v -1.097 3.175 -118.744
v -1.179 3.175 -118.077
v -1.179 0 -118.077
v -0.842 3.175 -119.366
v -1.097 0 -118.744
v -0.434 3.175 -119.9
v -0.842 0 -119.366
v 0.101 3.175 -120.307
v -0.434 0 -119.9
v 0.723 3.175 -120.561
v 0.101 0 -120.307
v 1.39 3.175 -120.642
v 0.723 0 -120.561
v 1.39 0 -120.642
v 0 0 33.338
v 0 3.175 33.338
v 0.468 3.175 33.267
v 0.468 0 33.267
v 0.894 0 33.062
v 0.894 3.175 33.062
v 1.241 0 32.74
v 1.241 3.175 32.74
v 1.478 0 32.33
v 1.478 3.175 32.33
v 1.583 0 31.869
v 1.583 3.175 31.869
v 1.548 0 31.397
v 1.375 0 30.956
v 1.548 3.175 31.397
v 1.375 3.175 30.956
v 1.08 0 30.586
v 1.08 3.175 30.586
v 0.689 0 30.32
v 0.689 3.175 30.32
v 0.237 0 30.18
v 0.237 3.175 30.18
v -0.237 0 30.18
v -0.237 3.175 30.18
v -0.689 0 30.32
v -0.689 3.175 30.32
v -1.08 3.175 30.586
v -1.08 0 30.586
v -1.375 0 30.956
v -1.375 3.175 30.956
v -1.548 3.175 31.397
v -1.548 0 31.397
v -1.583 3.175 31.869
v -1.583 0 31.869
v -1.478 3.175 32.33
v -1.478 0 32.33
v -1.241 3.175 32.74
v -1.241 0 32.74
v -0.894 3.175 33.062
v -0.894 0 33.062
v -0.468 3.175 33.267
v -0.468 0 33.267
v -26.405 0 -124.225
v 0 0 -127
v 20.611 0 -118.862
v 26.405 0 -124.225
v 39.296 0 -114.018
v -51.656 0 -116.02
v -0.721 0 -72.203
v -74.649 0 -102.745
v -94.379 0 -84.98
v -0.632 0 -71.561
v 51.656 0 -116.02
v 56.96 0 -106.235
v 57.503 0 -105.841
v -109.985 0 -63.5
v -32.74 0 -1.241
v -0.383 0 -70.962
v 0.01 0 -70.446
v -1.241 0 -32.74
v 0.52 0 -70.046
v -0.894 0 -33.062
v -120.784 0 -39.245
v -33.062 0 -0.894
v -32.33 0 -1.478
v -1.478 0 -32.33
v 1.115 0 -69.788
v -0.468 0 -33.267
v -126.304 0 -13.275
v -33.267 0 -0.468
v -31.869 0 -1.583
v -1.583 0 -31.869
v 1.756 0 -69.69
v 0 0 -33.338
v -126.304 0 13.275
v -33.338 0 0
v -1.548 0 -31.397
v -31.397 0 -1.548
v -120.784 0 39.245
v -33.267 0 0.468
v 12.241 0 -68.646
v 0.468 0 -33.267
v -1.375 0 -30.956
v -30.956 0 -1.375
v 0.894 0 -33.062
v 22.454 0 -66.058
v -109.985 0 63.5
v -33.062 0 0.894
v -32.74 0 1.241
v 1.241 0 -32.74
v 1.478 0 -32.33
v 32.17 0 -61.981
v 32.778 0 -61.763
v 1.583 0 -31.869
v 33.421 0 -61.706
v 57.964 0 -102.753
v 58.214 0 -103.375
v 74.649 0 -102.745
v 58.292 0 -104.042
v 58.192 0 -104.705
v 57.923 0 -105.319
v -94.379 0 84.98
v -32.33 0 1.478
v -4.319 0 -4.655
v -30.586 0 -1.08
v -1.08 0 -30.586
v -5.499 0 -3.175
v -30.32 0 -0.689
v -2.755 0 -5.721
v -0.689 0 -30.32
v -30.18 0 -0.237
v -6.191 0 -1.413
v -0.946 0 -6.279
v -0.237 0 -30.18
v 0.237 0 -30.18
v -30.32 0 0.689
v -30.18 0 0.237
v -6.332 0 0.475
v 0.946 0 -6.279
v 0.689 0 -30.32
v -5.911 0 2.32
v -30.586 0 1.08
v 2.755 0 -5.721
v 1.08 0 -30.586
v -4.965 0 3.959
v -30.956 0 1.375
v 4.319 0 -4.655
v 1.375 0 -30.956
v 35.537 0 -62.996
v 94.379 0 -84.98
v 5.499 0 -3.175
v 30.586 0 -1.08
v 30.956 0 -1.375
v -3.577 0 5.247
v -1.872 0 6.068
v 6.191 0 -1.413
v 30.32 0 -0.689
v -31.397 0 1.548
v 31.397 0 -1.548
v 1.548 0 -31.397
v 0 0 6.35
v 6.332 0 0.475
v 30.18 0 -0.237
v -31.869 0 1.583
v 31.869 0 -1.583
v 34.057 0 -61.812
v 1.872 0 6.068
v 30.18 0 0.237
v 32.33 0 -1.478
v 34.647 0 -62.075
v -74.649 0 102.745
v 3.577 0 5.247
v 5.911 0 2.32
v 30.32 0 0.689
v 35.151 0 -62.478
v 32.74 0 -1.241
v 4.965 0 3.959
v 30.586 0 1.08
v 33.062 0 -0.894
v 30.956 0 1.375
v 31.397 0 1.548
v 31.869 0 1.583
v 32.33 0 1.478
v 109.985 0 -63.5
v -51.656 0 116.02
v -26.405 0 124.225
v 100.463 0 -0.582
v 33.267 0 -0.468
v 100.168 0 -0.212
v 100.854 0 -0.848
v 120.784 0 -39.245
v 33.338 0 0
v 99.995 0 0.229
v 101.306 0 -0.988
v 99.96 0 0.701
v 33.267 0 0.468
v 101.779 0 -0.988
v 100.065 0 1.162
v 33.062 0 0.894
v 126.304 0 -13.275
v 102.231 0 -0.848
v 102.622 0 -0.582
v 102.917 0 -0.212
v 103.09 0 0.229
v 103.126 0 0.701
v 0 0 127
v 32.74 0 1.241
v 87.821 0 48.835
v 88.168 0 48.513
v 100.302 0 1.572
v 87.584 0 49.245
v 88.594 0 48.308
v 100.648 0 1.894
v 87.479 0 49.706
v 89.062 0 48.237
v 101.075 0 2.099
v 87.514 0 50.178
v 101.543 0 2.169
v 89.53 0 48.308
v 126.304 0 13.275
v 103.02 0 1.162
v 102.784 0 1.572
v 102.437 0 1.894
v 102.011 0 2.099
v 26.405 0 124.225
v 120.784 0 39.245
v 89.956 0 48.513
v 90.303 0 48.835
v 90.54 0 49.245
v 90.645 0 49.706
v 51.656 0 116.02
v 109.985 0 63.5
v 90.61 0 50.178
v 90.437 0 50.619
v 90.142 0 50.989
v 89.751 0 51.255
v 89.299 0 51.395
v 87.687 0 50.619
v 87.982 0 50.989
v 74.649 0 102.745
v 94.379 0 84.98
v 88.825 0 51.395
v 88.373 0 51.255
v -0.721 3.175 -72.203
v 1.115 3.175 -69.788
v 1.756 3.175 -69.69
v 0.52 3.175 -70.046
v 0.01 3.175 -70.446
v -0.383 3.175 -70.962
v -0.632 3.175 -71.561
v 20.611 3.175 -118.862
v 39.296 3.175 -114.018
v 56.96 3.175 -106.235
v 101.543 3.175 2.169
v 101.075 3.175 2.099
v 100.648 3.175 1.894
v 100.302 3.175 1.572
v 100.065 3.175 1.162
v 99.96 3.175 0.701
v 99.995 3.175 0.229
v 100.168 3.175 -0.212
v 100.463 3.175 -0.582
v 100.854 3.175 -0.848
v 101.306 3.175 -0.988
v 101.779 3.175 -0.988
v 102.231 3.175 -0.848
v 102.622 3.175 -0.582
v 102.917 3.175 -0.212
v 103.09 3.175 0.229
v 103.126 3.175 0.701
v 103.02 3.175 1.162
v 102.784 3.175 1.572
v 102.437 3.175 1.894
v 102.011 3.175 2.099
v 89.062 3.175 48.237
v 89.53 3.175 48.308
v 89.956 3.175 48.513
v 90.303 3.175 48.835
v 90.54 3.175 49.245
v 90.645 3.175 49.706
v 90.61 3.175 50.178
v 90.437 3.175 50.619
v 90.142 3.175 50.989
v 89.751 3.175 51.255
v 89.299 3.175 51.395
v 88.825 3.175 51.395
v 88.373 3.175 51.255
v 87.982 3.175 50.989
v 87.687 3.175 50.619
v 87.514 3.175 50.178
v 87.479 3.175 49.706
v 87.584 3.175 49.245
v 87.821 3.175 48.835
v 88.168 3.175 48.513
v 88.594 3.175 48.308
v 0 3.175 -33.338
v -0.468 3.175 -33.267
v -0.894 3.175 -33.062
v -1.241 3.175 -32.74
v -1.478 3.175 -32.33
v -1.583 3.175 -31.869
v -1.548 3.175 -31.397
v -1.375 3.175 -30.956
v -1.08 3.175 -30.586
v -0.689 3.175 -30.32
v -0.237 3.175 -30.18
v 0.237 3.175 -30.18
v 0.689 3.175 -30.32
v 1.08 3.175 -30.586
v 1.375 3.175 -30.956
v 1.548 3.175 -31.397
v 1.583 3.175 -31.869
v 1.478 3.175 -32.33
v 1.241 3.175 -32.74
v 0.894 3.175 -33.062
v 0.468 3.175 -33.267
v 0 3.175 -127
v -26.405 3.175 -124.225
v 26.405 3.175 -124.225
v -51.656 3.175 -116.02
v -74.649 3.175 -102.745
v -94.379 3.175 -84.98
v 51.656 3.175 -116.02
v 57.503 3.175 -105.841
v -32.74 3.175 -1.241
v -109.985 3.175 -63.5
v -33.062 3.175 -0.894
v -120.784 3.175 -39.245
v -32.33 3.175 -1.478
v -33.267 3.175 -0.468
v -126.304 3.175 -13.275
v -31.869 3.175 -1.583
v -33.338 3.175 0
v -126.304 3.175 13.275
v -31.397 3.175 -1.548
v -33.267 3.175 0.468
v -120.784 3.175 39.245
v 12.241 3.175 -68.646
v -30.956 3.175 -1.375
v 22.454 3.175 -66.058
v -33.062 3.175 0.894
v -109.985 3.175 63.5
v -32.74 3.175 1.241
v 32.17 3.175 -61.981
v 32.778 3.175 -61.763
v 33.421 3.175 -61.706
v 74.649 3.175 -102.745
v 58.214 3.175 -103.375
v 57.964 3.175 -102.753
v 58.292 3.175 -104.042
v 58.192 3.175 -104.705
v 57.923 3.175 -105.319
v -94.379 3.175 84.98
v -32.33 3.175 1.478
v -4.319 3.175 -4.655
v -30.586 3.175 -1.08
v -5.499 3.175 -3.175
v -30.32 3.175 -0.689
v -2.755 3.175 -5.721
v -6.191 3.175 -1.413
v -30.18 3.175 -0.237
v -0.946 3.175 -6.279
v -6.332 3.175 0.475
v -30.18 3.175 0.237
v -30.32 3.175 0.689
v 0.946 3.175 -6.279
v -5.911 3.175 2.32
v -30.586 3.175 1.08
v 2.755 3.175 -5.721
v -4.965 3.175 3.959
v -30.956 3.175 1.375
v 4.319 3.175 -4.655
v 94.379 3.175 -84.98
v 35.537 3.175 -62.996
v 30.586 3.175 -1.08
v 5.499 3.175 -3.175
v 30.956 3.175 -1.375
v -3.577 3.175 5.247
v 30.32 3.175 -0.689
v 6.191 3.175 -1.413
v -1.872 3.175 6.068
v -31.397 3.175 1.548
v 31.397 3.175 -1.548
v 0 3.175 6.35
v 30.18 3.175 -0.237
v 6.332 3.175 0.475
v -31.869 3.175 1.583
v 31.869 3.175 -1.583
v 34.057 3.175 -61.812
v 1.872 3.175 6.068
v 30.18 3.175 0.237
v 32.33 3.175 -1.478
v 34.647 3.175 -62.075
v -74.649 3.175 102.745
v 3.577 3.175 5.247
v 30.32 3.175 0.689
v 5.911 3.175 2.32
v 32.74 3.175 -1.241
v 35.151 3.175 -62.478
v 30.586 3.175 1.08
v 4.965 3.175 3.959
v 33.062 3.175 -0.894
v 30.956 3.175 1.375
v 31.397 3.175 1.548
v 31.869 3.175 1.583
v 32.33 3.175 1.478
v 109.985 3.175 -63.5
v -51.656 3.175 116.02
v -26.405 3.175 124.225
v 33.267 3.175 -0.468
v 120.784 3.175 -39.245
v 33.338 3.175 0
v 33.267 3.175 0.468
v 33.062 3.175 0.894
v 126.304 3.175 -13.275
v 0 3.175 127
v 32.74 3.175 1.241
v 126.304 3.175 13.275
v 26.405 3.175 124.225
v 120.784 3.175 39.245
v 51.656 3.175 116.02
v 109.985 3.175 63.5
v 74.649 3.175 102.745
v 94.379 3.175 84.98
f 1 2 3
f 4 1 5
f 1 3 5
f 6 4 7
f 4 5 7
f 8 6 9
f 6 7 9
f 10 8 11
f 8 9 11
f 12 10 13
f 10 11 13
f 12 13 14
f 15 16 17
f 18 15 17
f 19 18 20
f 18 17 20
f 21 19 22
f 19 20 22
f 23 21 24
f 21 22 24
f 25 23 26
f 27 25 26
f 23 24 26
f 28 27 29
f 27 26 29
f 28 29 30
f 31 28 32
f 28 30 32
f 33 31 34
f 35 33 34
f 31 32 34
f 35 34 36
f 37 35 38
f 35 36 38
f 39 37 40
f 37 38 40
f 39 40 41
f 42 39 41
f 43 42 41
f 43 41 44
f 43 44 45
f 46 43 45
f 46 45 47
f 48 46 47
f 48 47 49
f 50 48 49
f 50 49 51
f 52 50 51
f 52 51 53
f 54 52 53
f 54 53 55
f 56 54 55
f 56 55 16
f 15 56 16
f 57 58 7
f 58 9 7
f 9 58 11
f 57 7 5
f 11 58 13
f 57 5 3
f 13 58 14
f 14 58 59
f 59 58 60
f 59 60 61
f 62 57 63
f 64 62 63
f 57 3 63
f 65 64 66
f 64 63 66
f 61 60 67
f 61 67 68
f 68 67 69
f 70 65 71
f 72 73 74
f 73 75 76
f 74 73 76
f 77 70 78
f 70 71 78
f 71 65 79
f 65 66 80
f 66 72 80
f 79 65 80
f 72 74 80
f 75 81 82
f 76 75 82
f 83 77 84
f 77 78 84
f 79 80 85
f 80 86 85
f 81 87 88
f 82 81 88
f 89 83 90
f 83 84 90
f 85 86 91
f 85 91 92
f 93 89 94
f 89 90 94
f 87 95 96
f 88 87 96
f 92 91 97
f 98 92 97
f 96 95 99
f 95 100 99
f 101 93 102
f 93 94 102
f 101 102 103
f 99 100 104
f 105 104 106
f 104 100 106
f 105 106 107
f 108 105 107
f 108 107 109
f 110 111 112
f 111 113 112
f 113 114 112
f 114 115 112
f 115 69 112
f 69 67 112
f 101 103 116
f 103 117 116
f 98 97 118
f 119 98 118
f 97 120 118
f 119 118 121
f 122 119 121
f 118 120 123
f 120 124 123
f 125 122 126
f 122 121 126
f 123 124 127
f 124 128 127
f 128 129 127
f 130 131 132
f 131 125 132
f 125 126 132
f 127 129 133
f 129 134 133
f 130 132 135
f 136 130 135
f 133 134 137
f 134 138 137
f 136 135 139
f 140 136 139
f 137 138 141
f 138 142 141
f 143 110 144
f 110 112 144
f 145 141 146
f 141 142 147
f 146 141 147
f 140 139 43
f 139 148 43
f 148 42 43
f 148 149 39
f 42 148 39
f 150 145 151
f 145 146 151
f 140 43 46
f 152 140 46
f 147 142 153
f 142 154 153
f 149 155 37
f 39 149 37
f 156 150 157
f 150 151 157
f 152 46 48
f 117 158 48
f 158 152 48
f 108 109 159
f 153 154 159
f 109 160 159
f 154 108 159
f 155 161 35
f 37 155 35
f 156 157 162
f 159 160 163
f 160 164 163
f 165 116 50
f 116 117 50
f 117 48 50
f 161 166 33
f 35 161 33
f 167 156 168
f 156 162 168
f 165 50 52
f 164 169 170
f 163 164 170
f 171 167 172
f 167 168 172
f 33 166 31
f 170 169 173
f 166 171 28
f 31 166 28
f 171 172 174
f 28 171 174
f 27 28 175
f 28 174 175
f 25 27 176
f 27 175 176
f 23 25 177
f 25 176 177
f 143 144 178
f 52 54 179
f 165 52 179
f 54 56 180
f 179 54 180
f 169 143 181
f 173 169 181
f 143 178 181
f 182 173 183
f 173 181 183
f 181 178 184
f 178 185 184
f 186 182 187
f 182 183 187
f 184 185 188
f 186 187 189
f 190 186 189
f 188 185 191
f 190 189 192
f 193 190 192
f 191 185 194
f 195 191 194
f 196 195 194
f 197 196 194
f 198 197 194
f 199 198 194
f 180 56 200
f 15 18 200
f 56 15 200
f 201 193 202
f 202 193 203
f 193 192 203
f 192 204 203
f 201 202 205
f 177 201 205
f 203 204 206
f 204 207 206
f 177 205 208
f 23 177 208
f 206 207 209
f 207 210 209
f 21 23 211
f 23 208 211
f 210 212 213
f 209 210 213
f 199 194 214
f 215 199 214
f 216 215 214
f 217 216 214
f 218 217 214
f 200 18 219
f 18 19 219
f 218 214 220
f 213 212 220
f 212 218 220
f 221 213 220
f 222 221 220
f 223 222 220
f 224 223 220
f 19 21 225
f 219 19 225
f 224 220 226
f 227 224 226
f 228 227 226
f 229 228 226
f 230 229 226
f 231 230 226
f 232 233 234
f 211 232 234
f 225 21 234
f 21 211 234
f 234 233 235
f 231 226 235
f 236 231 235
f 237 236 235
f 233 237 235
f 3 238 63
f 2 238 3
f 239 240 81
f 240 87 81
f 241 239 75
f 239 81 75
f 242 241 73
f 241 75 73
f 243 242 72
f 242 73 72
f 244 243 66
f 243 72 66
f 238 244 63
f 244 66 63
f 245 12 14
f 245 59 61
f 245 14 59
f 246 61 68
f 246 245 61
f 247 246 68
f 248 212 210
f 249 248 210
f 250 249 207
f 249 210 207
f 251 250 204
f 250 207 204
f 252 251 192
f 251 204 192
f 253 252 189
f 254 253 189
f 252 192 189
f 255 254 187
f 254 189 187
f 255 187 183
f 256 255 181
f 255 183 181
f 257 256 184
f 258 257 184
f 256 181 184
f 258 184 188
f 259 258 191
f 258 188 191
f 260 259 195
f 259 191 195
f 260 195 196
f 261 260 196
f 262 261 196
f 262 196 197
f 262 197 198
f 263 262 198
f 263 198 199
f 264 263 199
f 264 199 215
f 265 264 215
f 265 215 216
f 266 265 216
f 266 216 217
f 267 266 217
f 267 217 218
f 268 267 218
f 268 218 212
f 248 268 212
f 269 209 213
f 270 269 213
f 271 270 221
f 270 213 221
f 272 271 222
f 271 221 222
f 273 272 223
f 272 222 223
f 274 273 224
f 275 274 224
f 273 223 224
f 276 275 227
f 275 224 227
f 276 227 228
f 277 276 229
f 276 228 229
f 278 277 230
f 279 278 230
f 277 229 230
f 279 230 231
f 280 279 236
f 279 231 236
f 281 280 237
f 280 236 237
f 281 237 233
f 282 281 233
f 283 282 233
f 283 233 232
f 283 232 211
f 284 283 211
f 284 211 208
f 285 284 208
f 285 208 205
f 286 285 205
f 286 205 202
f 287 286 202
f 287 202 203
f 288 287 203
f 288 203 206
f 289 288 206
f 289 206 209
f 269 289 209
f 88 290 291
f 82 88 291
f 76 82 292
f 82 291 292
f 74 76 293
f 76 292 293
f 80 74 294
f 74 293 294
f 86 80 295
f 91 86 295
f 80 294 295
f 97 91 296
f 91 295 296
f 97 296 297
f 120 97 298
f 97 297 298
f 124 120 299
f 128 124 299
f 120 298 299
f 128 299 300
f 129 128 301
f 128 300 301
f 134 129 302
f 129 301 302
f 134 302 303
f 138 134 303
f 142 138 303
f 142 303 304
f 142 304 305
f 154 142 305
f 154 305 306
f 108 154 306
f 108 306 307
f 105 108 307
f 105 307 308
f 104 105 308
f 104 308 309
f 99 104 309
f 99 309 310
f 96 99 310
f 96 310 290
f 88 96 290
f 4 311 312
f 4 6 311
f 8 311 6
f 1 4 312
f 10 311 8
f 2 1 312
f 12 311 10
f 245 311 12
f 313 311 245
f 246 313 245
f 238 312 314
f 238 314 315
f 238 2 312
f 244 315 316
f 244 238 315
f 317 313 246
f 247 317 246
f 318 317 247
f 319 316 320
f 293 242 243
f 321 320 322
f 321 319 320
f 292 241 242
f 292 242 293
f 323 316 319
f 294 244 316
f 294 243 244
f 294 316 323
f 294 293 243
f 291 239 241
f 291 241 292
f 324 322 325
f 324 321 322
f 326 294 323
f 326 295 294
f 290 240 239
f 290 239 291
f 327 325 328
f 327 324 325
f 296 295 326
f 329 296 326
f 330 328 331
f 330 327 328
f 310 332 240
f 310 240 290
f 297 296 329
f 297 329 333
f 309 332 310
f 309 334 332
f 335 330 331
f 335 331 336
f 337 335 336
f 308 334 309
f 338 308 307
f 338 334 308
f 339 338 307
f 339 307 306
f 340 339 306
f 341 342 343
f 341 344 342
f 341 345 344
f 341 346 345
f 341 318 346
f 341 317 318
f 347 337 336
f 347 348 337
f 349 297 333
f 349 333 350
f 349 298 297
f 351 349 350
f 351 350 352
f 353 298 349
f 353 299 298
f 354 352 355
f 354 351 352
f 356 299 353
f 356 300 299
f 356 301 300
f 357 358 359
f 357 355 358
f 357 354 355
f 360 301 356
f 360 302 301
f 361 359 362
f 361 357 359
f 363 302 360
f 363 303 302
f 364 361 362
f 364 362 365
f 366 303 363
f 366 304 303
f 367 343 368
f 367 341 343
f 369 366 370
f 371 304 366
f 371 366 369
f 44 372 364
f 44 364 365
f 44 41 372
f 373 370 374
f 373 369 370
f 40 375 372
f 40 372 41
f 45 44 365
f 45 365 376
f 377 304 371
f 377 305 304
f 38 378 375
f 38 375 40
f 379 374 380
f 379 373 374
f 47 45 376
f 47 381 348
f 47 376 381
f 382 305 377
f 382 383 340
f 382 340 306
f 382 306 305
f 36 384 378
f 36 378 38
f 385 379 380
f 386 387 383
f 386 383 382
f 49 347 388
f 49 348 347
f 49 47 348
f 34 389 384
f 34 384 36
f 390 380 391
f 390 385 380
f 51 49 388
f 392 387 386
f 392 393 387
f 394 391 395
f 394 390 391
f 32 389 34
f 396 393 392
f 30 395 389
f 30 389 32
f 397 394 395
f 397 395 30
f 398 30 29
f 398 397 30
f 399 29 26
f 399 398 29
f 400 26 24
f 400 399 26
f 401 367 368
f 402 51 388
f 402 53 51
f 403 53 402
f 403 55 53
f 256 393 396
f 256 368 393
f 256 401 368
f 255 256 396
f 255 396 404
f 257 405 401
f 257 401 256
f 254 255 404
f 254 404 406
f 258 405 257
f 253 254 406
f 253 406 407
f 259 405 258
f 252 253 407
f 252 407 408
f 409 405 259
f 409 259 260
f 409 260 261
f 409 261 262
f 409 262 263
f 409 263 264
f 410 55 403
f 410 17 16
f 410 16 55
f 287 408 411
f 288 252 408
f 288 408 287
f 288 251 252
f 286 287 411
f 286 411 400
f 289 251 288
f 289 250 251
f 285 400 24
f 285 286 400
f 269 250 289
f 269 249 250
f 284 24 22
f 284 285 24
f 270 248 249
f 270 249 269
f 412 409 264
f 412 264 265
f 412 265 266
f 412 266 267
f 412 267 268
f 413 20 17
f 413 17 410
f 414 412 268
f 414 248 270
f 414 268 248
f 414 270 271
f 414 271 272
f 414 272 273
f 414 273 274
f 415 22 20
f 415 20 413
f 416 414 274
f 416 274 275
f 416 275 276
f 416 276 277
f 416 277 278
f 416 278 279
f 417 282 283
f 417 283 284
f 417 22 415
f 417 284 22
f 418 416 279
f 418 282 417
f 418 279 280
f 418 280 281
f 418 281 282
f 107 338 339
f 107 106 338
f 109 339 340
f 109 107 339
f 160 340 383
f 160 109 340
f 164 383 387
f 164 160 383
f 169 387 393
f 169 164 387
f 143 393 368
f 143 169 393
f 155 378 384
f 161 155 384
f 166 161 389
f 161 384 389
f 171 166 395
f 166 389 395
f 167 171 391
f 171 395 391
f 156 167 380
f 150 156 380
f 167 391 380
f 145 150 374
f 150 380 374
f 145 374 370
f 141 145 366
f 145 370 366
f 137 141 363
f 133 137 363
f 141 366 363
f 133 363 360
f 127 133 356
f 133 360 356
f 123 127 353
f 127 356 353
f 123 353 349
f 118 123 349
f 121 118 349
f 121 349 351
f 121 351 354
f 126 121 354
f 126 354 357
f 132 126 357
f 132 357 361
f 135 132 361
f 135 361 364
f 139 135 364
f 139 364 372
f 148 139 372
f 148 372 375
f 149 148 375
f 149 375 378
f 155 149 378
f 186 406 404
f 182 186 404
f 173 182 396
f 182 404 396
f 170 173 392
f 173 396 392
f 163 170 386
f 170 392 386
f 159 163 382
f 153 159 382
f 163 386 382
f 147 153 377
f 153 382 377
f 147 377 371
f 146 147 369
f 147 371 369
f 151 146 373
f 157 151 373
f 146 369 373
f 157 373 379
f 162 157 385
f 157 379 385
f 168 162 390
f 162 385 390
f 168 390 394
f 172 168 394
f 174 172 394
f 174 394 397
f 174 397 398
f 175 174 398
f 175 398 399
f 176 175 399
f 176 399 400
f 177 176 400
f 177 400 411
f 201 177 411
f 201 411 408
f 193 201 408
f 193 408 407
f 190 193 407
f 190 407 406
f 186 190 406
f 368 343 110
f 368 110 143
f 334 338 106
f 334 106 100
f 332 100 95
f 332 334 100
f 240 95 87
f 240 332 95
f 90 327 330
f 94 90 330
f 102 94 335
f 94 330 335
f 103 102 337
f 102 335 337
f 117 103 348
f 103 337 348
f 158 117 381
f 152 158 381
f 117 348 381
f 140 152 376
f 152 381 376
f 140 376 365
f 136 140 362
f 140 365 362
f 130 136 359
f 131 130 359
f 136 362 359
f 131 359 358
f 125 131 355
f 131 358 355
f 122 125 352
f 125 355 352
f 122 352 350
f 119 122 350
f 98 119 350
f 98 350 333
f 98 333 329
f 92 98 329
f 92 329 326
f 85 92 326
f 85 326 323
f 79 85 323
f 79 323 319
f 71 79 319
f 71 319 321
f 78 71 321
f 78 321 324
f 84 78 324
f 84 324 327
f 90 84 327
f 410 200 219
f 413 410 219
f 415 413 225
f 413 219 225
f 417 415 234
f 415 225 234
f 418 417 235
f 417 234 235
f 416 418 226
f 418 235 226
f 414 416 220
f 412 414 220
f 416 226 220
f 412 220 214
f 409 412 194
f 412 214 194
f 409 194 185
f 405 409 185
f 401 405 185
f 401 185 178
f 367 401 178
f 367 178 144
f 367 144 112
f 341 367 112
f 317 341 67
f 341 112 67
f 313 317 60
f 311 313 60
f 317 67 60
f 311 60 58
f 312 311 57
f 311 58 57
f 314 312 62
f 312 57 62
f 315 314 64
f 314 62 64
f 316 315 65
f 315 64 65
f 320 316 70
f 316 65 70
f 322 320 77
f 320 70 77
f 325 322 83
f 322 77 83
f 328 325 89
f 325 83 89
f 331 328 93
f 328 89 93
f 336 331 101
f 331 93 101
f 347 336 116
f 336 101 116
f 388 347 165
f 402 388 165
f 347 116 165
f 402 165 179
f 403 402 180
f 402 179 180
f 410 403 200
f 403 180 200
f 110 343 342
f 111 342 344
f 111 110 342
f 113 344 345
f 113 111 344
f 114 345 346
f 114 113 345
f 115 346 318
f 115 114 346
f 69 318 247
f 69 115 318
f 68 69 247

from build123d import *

# Parameters (mm, degrees)
SKETCH1_R           = 127
BOSS_EXTRUDE1_DEPTH = 3.175
SKETCH2_R           = 6.35
CUT_EXTRUDE1_DEPTH  = 180.63318353
CUT_EXTRUDE2_DEPTH  = 180.63318353
SKETCH4_R           = 1.5875
CUT_EXTRUDE3_DEPTH  = 180.63318353
CIRPATTERN1_COUNT   = 4
FILLET1_R           = 2.54
SKETCH5_R           = 1.5875
CUT_EXTRUDE4_DEPTH  = 180.63318353


with BuildPart() as part:
    # Sketch1 → Boss-Extrude1 (new body)
    with BuildSketch(Plane(origin=(0, 0, 0), x_dir=(1, 0, 0), z_dir=(0, 1, 0))):
        with Locations(Location((0, 0, 0), (0, 0, 270))):
            Circle(SKETCH1_R)
    extrude(amount=BOSS_EXTRUDE1_DEPTH)

    # Sketch2 → Cut-Extrude1 (cut, through all)
    with BuildSketch(Plane(origin=(0, 3.175, 0), x_dir=(1, 0, 0), z_dir=(0, 1, 0))):
        with Locations(Location((0, 0, 0), (0, 0, 270))):
            Circle(SKETCH2_R)
    extrude(amount=-CUT_EXTRUDE1_DEPTH, mode=Mode.SUBTRACT)

    # Sketch3 → Cut-Extrude2 (cut, through all)
    with BuildSketch(Plane(origin=(0, 3.175, 0), x_dir=(1, 0, 0), z_dir=(0, 1, 0))):
        with BuildLine():
            Line((-0.69608151, 69.707591228), (-1.204718825, 120.643985149))
            ThreePointArc((-1.204718825, 120.643985149), (30.046443244, 116.817986877), (59.221085226, 104.981025331))
            Line((59.221085226, 104.981025331), (34.319233166, 60.837593106))
            ThreePointArc((34.319233166, 60.837593106), (17.387075213, 67.544440681), (-0.69608151, 69.707591228))
        make_face()
    extrude(amount=-CUT_EXTRUDE2_DEPTH, mode=Mode.SUBTRACT)

    # Sketch4 → Cut-Extrude3 (cut, through all)
    with BuildSketch(Plane(origin=(0, 3.175, 0), x_dir=(1, 0, 0), z_dir=(0, 1, 0))):
        with Locations(Location((0, -31.75, 0), (0, 0, 270))):
            Circle(SKETCH4_R)
    cut_extrude3 = extrude(amount=-CUT_EXTRUDE3_DEPTH, mode=Mode.SUBTRACT)

    # CirPattern1: Cut-Extrude3 ×4 about axis
    cirpattern1_axis = Axis((0, 0, 0), (0, 1, 0))
    for i in range(1, CIRPATTERN1_COUNT):
        add(cut_extrude3.rotate(cirpattern1_axis, i * 360 / CIRPATTERN1_COUNT), mode=Mode.SUBTRACT)

    # Fillet1
    fillet1_edges = [part.edges().sort_by_distance(p)[0] for p in [
        (34.319233166, 1.5875, -60.837593106),
        (-0.69608151, 1.5875, -69.707591228),
        (-1.204718825, 1.5875, -120.643985149),
        (59.221085226, 1.5875, -104.981025331),
    ]]
    fillet(fillet1_edges, radius=FILLET1_R)

    # Sketch5 → Cut-Extrude4 (cut, through all)
    with BuildSketch(Plane.XZ):
        with Locations(Location((89.061954982, 49.824926956, 0), (0, 0, 270))):
            Circle(SKETCH5_R)
        with Locations(Location((101.542683253, 0.581943478, 0), (0, 0, 90))):
            Circle(SKETCH5_R)
    extrude(amount=-CUT_EXTRUDE4_DEPTH, mode=Mode.SUBTRACT)


solid = part.part
